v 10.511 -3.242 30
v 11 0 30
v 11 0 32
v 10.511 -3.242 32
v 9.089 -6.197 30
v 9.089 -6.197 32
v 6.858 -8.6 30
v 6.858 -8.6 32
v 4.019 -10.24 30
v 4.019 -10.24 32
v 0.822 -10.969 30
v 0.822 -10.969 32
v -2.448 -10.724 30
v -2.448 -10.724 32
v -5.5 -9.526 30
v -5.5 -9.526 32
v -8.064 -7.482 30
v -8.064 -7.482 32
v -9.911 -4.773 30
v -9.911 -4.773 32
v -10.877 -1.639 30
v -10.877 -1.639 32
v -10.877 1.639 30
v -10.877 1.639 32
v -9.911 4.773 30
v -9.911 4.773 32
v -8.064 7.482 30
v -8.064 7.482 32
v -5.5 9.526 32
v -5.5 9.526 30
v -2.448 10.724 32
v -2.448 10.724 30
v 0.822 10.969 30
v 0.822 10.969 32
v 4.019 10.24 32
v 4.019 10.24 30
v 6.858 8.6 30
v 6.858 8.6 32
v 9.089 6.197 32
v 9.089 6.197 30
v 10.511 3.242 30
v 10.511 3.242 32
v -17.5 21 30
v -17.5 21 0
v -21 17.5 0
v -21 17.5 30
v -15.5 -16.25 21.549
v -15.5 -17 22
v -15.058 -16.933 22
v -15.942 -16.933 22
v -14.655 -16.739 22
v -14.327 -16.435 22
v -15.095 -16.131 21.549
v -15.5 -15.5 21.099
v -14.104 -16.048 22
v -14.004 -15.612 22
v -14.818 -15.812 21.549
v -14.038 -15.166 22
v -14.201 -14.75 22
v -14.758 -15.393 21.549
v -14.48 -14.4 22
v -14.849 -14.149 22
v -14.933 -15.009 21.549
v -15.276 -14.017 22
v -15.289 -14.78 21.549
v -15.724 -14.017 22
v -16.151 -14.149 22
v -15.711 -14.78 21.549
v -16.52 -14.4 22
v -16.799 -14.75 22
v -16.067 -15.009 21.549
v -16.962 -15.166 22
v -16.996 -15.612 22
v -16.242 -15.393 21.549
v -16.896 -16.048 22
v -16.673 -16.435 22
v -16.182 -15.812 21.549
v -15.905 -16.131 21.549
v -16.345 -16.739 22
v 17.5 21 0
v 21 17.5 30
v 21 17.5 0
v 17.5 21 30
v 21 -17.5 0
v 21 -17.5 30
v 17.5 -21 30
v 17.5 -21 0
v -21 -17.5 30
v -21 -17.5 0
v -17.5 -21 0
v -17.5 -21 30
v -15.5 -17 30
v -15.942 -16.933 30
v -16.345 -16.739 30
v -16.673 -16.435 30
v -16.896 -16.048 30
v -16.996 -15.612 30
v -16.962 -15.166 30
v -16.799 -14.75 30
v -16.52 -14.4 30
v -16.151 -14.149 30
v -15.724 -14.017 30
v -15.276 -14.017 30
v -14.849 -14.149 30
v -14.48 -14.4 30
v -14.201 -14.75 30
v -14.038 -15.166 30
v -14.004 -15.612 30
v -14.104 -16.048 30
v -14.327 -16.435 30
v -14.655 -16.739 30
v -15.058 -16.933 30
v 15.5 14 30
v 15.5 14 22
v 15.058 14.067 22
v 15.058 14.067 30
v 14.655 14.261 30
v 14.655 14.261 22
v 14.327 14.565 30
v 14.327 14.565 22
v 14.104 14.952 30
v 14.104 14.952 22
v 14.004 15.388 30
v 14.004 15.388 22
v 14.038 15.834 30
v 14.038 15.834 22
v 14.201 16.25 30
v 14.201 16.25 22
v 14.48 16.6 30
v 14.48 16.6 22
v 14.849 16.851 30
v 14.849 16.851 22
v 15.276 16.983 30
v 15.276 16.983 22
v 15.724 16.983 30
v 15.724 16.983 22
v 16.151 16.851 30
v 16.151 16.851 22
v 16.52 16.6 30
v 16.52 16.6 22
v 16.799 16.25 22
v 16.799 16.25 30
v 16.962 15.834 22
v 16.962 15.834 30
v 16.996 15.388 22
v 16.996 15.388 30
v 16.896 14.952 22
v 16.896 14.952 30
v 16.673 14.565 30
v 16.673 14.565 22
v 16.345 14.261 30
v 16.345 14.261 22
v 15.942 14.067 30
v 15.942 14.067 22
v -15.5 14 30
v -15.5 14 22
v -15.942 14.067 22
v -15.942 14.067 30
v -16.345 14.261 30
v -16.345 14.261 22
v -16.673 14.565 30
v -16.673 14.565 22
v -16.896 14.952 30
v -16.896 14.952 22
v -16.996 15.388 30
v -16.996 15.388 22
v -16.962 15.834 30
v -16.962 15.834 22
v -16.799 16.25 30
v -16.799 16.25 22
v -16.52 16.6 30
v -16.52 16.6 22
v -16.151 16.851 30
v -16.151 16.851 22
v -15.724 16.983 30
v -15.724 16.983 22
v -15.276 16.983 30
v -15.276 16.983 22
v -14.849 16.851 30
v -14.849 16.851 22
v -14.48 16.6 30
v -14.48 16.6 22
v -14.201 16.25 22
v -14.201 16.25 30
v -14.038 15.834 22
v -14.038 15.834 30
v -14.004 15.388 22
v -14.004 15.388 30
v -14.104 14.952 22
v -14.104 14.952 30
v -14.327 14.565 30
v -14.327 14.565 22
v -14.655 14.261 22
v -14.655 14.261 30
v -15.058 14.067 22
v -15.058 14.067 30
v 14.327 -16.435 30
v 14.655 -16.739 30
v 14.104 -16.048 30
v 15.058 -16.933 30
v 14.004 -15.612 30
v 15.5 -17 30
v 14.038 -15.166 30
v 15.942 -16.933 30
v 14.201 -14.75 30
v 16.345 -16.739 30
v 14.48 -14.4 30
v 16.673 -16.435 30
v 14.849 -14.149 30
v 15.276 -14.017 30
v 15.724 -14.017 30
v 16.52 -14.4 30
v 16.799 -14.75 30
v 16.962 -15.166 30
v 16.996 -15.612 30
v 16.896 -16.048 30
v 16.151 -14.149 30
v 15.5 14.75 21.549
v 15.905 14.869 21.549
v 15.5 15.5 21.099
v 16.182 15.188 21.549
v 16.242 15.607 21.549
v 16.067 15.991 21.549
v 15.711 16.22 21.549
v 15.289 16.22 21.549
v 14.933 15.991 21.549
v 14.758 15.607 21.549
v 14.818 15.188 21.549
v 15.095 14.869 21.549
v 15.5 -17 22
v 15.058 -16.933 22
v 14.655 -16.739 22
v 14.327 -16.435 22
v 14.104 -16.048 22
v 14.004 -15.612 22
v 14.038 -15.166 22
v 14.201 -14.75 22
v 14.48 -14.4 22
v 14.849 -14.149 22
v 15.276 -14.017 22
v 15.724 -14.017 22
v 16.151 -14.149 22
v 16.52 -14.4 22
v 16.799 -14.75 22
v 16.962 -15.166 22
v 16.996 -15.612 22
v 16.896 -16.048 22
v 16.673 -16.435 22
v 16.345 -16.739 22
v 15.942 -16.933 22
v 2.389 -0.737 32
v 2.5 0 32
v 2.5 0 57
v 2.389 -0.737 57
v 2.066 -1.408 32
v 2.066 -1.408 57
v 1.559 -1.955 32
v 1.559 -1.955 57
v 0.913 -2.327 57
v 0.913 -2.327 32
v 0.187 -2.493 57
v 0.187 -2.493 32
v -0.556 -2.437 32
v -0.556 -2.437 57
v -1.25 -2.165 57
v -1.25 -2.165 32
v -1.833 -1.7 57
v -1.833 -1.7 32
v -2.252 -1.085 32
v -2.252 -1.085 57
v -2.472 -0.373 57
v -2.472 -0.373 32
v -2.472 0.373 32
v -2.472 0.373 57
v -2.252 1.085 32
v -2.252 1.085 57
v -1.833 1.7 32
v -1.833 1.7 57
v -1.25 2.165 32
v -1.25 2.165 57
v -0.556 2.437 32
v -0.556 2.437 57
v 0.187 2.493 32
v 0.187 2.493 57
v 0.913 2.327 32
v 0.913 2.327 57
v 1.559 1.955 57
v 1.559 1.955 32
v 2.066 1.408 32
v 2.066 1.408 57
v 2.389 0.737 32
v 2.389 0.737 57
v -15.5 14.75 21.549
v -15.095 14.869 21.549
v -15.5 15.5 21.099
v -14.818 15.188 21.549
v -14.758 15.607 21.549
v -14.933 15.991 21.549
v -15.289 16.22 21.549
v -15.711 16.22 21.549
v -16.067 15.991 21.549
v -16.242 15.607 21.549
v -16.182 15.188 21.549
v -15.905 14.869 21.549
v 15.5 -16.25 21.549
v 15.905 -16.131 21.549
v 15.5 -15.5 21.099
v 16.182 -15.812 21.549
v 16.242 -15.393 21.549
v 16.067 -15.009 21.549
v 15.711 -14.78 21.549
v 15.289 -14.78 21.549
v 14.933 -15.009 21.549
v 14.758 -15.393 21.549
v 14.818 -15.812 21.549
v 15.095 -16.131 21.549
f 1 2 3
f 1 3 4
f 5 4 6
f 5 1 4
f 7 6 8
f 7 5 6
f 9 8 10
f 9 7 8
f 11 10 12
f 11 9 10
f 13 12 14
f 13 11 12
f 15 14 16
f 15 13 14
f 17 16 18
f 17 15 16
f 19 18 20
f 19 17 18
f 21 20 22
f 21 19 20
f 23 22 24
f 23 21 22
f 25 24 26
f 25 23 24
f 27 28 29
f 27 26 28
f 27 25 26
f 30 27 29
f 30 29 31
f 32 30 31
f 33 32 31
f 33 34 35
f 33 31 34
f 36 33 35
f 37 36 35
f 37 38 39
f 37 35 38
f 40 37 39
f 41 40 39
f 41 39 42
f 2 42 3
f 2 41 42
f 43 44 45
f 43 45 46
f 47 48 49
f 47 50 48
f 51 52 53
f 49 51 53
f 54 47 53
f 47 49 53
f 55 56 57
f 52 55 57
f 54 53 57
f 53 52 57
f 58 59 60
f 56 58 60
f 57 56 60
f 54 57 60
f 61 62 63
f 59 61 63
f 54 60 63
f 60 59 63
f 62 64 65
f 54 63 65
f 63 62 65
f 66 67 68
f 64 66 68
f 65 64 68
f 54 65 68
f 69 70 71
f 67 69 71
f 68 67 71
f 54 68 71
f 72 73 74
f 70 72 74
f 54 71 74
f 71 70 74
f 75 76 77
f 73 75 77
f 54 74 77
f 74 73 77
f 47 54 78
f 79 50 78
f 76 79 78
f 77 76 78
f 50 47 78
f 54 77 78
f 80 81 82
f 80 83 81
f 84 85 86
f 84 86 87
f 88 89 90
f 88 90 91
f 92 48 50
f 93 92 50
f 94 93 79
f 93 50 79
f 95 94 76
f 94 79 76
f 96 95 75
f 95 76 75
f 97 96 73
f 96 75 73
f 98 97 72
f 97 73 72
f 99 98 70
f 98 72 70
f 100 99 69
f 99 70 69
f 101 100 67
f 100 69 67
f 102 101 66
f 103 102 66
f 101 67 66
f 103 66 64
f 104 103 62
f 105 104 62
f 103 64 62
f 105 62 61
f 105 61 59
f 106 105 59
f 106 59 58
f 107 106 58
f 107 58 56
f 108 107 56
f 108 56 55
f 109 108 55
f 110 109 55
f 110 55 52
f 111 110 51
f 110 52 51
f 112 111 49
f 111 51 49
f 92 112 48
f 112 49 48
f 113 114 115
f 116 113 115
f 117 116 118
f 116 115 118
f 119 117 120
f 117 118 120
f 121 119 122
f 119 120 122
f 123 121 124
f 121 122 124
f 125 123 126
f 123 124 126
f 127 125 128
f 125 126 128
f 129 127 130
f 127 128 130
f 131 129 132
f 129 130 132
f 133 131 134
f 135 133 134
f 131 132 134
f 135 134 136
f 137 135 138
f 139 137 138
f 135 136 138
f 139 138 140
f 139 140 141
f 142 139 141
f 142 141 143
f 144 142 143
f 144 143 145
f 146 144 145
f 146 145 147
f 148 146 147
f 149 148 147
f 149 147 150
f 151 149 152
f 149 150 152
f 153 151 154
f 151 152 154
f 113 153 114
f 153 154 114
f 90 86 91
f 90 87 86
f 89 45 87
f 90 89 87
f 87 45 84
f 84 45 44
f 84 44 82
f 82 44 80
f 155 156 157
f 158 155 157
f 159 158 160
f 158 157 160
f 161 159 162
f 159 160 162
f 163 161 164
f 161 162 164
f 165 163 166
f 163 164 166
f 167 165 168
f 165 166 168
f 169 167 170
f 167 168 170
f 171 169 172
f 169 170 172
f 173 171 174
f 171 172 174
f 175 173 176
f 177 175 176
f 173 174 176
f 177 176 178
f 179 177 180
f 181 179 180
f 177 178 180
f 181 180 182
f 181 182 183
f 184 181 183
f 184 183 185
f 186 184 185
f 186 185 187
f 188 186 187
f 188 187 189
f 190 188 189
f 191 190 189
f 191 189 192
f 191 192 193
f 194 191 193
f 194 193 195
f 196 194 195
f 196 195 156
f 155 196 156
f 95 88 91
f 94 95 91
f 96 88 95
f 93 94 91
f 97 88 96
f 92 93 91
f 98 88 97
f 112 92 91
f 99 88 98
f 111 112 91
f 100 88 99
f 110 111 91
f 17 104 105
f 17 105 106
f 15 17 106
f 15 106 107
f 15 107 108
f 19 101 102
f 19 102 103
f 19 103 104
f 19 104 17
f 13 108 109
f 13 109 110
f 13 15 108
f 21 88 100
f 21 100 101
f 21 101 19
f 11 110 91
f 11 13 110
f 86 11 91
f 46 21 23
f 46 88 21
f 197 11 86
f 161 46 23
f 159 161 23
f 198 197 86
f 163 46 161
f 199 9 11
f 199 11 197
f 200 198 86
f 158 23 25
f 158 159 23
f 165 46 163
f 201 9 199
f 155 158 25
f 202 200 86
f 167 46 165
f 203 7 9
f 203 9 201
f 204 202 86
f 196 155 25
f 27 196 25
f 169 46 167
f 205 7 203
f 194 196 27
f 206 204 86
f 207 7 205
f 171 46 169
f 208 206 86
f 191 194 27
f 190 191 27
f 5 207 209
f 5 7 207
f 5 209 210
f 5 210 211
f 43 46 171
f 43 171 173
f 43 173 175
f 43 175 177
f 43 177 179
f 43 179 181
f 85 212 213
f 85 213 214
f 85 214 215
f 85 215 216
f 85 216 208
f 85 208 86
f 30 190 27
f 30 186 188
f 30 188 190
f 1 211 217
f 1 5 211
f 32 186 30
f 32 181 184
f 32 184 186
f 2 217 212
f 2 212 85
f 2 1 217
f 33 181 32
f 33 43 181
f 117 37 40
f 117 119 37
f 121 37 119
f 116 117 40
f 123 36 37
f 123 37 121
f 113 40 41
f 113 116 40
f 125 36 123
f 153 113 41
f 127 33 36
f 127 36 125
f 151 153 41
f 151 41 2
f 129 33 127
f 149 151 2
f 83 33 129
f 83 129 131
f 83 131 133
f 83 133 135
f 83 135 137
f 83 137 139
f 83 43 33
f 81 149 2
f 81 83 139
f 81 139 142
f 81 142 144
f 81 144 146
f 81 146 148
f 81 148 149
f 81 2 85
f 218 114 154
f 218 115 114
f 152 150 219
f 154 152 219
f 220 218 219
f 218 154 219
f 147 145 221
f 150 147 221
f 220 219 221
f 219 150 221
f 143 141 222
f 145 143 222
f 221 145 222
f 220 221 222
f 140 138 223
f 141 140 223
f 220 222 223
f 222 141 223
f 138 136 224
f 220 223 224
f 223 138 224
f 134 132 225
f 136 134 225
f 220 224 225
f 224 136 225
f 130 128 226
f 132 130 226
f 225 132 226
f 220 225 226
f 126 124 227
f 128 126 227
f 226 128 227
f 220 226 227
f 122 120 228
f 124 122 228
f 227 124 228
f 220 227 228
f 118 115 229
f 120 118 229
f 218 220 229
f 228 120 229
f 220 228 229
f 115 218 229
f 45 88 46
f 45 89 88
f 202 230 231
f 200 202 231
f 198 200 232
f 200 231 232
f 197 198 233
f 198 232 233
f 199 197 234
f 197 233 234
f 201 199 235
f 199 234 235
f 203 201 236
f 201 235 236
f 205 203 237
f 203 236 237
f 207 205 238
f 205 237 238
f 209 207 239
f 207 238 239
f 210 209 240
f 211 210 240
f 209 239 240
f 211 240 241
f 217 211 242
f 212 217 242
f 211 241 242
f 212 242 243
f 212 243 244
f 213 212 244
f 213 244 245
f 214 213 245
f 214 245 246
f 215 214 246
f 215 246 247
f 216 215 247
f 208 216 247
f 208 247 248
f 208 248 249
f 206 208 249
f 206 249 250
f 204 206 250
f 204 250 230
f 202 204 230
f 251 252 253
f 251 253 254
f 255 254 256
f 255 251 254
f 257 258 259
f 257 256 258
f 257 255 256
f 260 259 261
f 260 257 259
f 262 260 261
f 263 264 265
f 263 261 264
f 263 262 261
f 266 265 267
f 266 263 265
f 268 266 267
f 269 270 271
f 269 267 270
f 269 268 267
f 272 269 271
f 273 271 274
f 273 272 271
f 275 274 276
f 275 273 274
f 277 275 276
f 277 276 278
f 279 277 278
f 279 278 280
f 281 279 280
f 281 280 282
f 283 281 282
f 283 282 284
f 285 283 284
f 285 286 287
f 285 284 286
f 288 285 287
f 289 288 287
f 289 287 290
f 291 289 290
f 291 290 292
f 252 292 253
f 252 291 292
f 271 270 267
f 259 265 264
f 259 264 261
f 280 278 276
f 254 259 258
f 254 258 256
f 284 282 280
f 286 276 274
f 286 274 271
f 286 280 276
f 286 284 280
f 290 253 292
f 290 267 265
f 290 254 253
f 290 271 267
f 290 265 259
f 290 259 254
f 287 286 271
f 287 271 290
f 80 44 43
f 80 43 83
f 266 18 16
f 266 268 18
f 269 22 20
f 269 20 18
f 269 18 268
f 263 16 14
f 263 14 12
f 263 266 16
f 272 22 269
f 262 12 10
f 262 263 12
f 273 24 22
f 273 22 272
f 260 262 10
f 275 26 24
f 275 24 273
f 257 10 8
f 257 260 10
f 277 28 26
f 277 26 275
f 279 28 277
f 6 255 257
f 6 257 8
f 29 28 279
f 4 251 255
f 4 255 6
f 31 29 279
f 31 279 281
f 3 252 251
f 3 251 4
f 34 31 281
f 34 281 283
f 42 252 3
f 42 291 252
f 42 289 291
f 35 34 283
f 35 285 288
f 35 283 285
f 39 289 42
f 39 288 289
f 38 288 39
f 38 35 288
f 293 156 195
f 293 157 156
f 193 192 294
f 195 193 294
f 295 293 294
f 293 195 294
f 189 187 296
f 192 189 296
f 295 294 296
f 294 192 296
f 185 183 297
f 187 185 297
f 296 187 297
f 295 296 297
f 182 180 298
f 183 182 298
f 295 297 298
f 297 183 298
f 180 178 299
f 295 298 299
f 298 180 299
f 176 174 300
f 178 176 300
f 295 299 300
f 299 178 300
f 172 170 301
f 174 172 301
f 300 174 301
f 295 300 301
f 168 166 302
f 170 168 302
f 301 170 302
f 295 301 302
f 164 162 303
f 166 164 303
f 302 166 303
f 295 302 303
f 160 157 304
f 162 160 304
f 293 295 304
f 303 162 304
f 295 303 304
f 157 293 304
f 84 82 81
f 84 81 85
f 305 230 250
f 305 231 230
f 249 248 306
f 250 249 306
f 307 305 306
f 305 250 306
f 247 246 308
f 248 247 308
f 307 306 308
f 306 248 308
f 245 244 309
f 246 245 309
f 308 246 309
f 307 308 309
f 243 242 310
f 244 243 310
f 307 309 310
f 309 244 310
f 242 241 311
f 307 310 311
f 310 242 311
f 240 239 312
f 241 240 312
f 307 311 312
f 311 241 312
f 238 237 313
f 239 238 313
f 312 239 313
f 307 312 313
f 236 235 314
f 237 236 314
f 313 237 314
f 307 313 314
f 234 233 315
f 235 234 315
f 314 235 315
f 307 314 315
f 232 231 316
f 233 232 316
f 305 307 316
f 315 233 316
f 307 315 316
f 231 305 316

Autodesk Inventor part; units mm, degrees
ref_plane "YZ Plane" through (0, 0, 0) normal (1, 0, 0) x (0, 1, 0)
ref_plane "XZ Plane" through (0, 0, 0) normal (0, 1, 0) x (-1, 0, 0)
ref_plane "XY Plane" through (0, 0, 0) normal (0, 0, 1) x (1, 0, 0)
sketch "Sketch1" plane through (0, 0, 0) normal (0, 0, 1) x (1, 0, 0)
  line L0 (21, -21) -> (-21, -21)
  line L1 (-21, -21) -> (-21, 21)
  line L2 (-21, 21) -> (21, 21)
  line L3 (21, 21) -> (21, -21)
  line L4 (21, -21) -> (-21, 21) construction
  line L5 (-21, -21) -> (21, 21) construction
  point P0 (0, 0)
  dimension "d0" = 42
extrude "Extrusion1" add sketch "Sketch1" along normal blind 30
sketch "Sketch2" plane through (0, 0, 30) normal (0, 0, 1) x (1, 0, 0)
  point P0 (0, 0)
  point P1 (-15.5, 15.5)
  point P2 (-15.5, -15.5)
  point P3 (15.5, -15.5)
  point P4 (15.5, 15.5)
  dimension "d3" = 31
  dimension "d4" = 31
  dimension "d5" = 15.5
  dimension "d6" = 15.5
hole "Hole1" at (-15.5, 15.5, 30) at (-15.5, -15.5, 30) at (15.5, -15.5, 30) at (15.5, 15.5, 30) direction (0, 0, -1) diameter 3 depth 8 tip angle 118
chamfer "Chamfer1" distance 3.5 angle 45 4 edges at (21, 21, 15) (21, -21, 15) (-21, 21, 15) (-21, -21, 15)
sketch "Sketch3" plane through (0, 0, 30) normal (0, 0, 1) x (1, 0, 0)
  circle A0 centre (0, 0) radius 11
  dimension "d17" = 22
extrude "Extrusion2" add sketch "Sketch3" along normal blind 2
sketch "Sketch4" plane through (0, 0, 32) normal (0, 0, 1) x (1, 0, 0)
  circle A0 centre (0, 0) radius 11 projected
  circle A1 centre (0, 0) radius 2.5
  dimension "d20" = 5
extrude "Extrusion3" add sketch "Sketch4" along normal blind 25 contours A1
equation "\"d4\" = d3"
equation "\"d5\" = 0.5 * d3"
equation "\"d6\" = 0.5 * d3"
properties part number "Extruder Motor" material "Steel, Alloy"
